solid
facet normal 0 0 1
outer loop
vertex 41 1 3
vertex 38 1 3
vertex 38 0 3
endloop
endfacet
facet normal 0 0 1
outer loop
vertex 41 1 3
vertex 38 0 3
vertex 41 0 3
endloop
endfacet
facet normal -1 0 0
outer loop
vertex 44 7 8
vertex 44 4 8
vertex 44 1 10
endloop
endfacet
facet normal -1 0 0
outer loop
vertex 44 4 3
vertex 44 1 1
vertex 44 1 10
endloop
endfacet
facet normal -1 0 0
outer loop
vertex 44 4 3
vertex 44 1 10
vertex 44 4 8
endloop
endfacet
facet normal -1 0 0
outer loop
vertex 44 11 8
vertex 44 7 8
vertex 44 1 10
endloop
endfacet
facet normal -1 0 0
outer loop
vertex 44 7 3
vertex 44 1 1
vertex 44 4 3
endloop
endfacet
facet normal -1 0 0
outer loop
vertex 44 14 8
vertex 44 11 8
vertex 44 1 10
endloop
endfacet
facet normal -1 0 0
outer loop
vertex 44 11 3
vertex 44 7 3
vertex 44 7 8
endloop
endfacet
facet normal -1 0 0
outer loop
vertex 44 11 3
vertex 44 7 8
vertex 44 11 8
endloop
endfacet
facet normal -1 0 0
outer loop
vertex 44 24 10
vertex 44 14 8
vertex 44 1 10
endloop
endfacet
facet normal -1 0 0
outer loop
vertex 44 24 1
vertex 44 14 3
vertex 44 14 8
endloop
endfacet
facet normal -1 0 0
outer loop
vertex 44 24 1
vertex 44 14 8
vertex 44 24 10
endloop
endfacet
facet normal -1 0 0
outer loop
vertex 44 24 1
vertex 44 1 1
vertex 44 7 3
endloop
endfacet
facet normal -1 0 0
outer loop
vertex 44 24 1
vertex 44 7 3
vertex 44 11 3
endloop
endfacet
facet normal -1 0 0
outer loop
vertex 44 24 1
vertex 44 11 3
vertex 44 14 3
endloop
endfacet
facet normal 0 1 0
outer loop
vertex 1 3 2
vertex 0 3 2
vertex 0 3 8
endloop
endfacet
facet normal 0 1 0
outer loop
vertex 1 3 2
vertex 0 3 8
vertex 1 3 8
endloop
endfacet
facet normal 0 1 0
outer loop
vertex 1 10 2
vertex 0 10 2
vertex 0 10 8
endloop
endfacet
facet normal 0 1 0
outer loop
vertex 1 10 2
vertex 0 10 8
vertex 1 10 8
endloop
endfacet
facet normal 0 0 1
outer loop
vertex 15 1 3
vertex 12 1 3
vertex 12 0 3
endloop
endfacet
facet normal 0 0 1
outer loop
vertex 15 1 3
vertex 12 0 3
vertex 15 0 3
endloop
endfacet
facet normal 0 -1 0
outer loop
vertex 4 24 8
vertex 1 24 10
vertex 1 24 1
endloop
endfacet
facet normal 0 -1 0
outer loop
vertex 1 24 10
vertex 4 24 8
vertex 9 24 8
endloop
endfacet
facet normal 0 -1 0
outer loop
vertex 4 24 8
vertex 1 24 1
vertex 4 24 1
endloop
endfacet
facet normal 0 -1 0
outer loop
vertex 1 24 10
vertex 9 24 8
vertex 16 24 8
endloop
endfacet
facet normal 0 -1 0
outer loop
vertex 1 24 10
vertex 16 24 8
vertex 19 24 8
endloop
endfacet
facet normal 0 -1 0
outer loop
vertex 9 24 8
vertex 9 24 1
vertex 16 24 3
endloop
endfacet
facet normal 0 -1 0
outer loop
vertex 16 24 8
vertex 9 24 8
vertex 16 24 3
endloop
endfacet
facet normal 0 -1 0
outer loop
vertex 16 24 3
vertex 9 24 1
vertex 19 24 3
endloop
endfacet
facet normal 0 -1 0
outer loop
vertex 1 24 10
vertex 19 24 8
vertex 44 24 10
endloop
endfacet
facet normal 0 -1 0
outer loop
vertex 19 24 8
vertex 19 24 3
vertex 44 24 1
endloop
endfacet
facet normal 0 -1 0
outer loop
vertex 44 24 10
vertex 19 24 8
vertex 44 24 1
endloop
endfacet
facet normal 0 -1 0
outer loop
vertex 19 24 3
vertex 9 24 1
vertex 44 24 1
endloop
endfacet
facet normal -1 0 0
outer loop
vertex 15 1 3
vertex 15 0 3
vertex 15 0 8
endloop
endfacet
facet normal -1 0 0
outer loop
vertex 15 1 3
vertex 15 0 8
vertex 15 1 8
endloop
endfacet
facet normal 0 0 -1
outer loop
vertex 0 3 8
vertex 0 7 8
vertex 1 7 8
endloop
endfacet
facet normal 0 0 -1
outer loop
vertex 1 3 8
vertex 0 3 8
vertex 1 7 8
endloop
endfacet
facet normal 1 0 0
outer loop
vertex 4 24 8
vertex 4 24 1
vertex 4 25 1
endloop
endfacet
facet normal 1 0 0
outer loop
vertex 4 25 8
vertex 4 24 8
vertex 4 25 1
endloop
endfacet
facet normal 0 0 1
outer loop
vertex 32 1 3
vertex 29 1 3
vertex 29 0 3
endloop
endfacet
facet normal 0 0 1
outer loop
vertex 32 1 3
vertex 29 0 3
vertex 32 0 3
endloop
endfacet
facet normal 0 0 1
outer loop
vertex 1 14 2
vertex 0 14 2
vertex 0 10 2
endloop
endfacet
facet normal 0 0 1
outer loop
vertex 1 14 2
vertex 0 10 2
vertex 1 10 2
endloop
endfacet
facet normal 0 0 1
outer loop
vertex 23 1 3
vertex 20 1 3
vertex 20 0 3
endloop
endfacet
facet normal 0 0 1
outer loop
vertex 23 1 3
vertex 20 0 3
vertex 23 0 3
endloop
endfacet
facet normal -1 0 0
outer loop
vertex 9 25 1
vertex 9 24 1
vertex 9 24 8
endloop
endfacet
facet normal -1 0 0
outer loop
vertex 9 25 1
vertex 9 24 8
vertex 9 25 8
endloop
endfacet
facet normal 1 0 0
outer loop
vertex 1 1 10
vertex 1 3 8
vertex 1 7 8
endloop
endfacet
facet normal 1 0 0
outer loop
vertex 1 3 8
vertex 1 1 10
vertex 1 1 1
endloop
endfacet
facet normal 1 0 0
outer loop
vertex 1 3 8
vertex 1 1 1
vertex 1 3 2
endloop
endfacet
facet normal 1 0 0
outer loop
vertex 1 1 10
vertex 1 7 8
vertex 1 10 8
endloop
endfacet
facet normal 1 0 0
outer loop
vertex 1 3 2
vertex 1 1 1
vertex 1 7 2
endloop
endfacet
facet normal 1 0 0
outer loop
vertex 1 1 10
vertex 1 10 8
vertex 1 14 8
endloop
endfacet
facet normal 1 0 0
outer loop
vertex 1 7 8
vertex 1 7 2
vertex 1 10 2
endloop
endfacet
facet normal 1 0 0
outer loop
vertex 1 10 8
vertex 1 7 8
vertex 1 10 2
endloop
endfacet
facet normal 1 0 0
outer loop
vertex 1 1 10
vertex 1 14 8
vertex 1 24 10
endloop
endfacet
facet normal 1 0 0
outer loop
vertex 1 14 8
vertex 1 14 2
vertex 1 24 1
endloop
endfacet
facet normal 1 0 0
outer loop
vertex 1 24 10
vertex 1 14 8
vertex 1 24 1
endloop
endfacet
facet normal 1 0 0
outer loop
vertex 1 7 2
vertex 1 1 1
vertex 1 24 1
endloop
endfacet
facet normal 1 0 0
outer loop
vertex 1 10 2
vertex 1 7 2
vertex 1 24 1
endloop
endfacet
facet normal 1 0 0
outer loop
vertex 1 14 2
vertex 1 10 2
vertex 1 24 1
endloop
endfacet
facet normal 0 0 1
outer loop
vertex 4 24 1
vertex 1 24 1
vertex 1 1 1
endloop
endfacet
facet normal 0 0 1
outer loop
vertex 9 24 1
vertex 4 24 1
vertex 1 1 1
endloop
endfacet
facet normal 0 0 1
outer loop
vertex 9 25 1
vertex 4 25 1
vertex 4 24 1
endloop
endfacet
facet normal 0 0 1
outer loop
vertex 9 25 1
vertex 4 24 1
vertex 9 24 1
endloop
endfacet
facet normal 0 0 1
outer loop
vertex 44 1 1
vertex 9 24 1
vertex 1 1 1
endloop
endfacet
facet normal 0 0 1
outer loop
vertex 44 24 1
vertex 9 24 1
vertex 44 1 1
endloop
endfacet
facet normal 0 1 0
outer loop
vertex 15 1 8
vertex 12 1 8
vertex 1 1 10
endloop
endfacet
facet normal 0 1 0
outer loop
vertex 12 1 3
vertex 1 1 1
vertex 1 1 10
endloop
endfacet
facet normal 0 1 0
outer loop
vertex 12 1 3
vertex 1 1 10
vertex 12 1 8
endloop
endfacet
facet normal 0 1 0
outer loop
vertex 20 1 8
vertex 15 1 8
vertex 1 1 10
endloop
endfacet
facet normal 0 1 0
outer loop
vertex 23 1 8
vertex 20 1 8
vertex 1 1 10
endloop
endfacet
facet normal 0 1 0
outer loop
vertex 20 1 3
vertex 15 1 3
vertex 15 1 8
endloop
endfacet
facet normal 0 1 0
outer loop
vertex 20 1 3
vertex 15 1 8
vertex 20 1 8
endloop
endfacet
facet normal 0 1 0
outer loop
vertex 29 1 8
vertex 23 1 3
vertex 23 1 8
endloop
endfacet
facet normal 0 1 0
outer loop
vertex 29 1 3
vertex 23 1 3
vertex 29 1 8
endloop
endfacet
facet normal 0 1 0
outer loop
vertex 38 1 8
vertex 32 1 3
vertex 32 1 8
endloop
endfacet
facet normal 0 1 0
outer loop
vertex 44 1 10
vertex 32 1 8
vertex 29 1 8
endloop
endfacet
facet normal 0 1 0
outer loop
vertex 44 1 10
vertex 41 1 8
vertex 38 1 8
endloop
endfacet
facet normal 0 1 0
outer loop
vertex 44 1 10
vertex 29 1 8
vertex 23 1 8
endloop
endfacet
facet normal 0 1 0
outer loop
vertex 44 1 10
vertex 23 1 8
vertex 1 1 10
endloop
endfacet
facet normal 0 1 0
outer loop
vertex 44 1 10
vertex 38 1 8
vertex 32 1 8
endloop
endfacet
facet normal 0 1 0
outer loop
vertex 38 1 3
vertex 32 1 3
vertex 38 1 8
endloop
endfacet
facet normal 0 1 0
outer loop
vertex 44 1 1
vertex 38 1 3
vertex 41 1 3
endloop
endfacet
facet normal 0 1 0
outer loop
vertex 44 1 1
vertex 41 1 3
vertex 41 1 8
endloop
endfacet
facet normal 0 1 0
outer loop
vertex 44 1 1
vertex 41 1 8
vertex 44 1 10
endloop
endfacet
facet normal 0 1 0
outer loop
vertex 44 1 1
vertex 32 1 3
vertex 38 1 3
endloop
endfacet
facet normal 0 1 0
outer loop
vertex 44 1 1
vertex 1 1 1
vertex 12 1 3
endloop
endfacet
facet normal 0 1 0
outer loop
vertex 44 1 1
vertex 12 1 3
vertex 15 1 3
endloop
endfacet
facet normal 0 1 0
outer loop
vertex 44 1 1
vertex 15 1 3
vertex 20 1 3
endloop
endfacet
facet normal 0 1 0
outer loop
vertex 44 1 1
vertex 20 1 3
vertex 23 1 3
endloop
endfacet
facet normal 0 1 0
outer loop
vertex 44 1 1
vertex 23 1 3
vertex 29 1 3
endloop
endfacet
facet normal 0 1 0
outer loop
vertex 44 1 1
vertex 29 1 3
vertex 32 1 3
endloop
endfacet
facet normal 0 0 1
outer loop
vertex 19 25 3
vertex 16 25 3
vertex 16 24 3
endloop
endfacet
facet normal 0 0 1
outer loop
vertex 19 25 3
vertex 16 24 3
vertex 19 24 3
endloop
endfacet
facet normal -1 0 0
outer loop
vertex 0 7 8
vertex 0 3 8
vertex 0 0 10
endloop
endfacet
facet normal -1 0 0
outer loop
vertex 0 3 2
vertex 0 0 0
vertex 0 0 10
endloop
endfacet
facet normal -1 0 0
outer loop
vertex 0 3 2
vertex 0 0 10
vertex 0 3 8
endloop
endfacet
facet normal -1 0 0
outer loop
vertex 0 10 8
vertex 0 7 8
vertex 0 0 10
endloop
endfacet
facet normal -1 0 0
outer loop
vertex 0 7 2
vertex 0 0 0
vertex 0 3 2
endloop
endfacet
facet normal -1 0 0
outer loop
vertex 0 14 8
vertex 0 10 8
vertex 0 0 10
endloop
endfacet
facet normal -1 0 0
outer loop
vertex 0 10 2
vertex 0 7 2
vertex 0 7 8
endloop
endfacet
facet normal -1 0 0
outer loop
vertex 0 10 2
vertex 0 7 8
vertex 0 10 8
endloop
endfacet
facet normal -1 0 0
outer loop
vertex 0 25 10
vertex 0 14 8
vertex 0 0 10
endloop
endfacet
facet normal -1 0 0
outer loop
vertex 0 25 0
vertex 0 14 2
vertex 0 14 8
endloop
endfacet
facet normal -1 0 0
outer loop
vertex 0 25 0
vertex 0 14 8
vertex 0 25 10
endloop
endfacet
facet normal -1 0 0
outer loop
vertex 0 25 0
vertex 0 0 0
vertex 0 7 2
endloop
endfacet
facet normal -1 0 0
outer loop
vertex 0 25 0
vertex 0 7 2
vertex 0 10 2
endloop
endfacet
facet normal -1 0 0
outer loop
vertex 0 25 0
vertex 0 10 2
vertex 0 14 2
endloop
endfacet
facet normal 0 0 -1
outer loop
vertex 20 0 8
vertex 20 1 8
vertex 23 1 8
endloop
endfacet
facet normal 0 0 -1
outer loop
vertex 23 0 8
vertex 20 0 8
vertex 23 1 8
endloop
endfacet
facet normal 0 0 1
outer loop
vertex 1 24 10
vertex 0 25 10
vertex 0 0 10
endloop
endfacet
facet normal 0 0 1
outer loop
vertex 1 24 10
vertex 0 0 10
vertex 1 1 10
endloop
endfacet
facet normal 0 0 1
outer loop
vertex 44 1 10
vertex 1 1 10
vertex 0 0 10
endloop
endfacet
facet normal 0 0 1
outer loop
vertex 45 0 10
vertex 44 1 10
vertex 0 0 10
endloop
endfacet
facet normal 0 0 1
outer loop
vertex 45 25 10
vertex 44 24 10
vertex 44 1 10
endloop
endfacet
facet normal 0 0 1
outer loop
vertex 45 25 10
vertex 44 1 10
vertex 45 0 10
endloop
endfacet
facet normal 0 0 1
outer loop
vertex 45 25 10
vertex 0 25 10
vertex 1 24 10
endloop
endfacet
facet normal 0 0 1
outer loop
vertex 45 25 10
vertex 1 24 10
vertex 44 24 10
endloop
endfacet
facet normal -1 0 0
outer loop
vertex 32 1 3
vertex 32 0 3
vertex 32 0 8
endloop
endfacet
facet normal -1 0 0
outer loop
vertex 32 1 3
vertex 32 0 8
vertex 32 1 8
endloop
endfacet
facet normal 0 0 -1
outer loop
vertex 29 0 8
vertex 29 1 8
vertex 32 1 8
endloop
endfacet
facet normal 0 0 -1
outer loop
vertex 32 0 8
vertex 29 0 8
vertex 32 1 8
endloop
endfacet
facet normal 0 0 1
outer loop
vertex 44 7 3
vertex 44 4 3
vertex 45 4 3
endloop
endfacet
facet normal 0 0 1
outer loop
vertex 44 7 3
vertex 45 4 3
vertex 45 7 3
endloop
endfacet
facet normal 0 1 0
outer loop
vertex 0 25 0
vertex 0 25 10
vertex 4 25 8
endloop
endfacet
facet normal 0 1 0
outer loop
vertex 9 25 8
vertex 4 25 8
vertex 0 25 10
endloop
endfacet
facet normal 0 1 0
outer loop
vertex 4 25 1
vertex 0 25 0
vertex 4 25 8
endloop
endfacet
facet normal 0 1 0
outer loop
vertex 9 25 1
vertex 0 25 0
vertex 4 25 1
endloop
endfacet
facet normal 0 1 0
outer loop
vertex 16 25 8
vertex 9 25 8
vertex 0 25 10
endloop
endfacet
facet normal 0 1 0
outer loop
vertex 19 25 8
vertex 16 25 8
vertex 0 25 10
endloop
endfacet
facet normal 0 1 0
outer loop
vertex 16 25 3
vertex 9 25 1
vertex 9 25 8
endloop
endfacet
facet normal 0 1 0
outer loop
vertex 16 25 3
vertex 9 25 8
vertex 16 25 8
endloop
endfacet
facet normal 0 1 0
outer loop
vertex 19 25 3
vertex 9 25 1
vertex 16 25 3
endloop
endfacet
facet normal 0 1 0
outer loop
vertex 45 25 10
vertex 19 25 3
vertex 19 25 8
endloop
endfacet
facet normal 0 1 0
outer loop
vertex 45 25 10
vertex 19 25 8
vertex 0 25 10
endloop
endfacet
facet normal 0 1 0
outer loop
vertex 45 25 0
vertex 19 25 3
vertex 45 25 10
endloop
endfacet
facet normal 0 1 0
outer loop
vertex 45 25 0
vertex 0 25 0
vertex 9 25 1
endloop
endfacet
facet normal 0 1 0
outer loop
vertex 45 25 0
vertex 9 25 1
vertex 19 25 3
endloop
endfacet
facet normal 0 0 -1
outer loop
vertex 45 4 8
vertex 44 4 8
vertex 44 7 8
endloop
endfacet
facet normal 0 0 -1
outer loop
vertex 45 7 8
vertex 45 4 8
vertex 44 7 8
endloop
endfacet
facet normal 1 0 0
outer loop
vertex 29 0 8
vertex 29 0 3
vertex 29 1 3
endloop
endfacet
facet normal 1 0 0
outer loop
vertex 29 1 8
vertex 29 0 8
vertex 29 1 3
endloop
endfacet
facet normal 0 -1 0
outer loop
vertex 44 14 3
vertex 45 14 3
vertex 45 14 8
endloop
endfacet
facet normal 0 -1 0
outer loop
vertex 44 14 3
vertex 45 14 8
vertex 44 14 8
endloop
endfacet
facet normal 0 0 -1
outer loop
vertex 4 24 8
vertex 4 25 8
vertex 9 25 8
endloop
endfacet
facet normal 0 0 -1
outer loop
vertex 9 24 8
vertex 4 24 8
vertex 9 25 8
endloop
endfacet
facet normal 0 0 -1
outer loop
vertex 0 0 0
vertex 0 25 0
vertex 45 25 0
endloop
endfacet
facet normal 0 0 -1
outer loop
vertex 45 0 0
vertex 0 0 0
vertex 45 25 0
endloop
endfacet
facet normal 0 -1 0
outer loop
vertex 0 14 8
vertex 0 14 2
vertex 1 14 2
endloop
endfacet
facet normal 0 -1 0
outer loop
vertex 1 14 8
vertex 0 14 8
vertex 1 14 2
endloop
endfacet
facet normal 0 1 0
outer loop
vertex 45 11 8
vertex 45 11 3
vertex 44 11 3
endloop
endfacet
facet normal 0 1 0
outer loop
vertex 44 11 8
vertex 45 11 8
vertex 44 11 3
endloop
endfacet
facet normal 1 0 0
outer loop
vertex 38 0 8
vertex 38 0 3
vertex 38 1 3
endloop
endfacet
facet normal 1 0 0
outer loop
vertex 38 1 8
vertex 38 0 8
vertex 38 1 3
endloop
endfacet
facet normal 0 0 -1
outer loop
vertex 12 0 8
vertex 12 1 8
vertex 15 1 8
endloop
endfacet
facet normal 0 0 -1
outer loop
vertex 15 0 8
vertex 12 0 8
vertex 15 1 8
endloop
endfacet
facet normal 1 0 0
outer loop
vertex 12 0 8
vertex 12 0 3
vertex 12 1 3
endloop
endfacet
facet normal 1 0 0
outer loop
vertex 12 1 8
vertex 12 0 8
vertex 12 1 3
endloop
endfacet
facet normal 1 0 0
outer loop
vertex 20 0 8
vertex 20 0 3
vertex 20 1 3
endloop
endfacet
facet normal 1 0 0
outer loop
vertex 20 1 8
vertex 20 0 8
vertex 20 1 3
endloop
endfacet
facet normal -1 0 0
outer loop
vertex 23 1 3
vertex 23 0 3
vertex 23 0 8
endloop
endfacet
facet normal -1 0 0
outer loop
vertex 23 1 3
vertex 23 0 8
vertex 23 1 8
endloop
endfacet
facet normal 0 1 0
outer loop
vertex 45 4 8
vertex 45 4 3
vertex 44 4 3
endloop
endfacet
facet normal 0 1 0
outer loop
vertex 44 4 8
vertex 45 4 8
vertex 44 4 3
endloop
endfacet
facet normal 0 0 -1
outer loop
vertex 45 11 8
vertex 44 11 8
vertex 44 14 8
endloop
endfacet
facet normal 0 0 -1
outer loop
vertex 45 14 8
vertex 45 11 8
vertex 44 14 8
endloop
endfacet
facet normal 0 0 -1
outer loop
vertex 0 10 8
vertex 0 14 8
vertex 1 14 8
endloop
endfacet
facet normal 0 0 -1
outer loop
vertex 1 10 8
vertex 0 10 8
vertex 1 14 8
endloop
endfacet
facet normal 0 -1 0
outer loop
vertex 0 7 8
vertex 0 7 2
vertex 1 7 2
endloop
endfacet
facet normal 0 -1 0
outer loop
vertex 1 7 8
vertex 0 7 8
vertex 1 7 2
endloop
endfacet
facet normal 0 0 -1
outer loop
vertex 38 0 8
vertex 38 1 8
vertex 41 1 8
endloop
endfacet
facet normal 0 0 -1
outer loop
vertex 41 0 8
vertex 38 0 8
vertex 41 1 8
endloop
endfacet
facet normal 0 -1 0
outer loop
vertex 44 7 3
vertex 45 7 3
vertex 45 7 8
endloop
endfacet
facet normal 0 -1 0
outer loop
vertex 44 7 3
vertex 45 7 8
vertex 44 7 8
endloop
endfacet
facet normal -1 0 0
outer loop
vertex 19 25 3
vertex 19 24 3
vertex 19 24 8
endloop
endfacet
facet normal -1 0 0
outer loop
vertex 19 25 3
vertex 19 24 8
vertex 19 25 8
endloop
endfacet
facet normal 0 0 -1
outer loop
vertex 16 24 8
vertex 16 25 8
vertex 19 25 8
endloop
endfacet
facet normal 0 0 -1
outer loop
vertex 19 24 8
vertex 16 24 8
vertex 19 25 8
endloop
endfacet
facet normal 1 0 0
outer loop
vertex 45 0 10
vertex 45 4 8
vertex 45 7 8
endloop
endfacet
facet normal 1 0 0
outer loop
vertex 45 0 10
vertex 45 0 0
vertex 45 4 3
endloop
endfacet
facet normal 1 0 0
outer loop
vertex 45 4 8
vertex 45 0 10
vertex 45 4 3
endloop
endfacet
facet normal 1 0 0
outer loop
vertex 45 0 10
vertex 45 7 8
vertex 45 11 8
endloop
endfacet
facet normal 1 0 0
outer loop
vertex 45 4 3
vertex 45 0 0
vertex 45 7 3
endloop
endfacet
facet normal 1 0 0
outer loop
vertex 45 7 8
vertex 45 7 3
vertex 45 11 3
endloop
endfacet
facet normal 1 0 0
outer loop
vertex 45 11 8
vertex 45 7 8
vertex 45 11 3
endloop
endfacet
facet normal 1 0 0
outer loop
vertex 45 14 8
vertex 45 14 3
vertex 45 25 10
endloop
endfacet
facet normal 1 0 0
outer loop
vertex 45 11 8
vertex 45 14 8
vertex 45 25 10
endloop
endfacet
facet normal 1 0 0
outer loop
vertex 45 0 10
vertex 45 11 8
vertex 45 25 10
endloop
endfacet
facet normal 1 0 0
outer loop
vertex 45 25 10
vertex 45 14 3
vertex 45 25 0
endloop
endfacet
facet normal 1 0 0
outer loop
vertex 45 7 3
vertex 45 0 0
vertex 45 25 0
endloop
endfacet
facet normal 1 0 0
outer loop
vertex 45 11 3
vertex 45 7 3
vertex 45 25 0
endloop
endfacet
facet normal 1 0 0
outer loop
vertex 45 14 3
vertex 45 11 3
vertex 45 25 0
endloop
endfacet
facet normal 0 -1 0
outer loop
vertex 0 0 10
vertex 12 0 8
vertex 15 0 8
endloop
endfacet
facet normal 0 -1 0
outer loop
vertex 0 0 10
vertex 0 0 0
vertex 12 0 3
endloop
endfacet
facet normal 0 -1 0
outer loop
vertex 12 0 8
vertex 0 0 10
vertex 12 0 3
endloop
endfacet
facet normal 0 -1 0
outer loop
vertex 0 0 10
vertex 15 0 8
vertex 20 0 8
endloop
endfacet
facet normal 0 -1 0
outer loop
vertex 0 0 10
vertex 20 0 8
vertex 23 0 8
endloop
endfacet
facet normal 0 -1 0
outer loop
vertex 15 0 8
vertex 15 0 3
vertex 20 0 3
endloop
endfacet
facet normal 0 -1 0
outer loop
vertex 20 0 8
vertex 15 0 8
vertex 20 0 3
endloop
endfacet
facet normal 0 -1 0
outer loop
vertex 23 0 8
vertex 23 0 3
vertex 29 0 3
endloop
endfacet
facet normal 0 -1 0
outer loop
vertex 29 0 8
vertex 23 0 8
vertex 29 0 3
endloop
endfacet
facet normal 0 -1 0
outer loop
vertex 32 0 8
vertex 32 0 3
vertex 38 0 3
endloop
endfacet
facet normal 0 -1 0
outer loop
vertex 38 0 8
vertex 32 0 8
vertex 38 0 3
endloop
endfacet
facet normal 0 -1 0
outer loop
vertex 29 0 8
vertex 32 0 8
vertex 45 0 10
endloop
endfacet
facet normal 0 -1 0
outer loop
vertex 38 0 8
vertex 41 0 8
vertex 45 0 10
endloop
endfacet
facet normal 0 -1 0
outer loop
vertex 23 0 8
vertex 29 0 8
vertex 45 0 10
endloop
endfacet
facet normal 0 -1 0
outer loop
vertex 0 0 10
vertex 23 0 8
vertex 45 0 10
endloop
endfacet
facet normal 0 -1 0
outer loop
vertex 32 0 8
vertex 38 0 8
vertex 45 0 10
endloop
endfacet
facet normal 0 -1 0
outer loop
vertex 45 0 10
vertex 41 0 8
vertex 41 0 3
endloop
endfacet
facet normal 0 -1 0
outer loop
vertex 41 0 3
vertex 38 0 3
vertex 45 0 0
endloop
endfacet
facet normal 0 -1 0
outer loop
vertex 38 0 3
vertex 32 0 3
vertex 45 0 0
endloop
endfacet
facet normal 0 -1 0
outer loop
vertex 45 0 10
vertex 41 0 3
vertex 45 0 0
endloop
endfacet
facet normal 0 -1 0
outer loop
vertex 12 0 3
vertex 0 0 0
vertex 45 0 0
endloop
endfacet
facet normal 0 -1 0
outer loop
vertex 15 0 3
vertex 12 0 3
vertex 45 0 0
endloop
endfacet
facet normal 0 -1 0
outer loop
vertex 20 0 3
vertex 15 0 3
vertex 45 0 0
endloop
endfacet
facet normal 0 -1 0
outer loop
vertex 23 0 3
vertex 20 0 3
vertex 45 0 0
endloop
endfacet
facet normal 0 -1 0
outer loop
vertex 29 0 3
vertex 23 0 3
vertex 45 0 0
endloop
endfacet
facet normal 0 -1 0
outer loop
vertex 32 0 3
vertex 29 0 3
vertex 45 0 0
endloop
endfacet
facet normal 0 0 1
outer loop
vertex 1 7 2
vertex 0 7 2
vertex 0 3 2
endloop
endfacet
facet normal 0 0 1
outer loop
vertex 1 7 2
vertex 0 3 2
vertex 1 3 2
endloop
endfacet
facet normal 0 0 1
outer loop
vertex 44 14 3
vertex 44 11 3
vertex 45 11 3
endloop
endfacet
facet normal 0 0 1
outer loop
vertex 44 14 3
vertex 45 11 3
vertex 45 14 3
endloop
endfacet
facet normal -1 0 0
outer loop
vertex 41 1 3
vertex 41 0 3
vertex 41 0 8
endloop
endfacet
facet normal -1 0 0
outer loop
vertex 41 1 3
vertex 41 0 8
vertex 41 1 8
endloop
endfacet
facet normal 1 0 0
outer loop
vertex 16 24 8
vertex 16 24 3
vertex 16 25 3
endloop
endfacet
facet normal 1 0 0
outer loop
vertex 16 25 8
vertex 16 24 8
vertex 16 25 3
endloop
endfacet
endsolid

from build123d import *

# Parameters (mm, degrees)
BOX101_W     = 3
BOX101_H     = 4
BOX101_DEPTH = 6
BOX060_W     = 3
BOX060_H     = 6
BOX060_DEPTH = 5
BOX061_W     = 3
BOX061_H     = 6
BOX061_DEPTH = 5
BOX063_W     = 3
BOX063_H     = 6
BOX063_DEPTH = 5
BOX062_W     = 3
BOX062_H     = 6
BOX062_DEPTH = 5
BOX058_W     = 3
BOX058_H     = 6
BOX058_DEPTH = 5
BOX059_W     = 3
BOX059_H     = 6
BOX059_DEPTH = 5
BOX056_W     = 3
BOX056_H     = 6
BOX056_DEPTH = 5
BOX026_W     = 5
BOX026_H     = 7
BOX026_DEPTH = 7
BOX020_W     = 6
BOX020_H     = 4
BOX020_DEPTH = 6
BOX_W        = 43
BOX_H        = 23
BOX_DEPTH    = 10
BOX001_W     = 45
BOX001_H     = 25
BOX001_DEPTH = 10


with BuildPart() as box101:
    # Box101 → Box101 (new body)
    with BuildSketch(Plane(origin=(0, 3, 2), x_dir=(1, 0, 0), z_dir=(0, 0, 1))):
        with Locations((1.5, 2)):
            Rectangle(BOX101_W, BOX101_H)
    extrude(amount=BOX101_DEPTH)


with BuildPart() as box060:
    # Box060 → Box060 (new body)
    with BuildSketch(Plane(origin=(29, -2, 3), x_dir=(1, 0, 0), z_dir=(0, 0, 1))):
        with Locations((1.5, 3)):
            Rectangle(BOX060_W, BOX060_H)
    extrude(amount=BOX060_DEPTH)


with BuildPart() as box061:
    # Box061 → Box061 (new body)
    with BuildSketch(Plane(origin=(38, -2, 3), x_dir=(1, 0, 0), z_dir=(0, 0, 1))):
        with Locations((1.5, 3)):
            Rectangle(BOX061_W, BOX061_H)
    extrude(amount=BOX061_DEPTH)


with BuildPart() as box063:
    # Box063 → Box063 (new body)
    with BuildSketch(Plane(origin=(46, 11, 3), x_dir=(0, 1, 0), z_dir=(0, 0, 1))):
        with Locations((1.5, 3)):
            Rectangle(BOX063_W, BOX063_H)
    extrude(amount=BOX063_DEPTH)


with BuildPart() as box062:
    # Box062 → Box062 (new body)
    with BuildSketch(Plane(origin=(46, 4, 3), x_dir=(0, 1, 0), z_dir=(0, 0, 1))):
        with Locations((1.5, 3)):
            Rectangle(BOX062_W, BOX062_H)
    extrude(amount=BOX062_DEPTH)


with BuildPart() as box058:
    # Box058 → Box058 (new body)
    with BuildSketch(Plane(origin=(12, -2, 3), x_dir=(1, 0, 0), z_dir=(0, 0, 1))):
        with Locations((1.5, 3)):
            Rectangle(BOX058_W, BOX058_H)
    extrude(amount=BOX058_DEPTH)


with BuildPart() as box059:
    # Box059 → Box059 (new body)
    with BuildSketch(Plane(origin=(20, -2, 3), x_dir=(1, 0, 0), z_dir=(0, 0, 1))):
        with Locations((1.5, 3)):
            Rectangle(BOX059_W, BOX059_H)
    extrude(amount=BOX059_DEPTH)


with BuildPart() as box056:
    # Box056 → Box056 (new body)
    with BuildSketch(Plane(origin=(16, 20, 3), x_dir=(1, 0, 0), z_dir=(0, 0, 1))):
        with Locations((1.5, 3)):
            Rectangle(BOX056_W, BOX056_H)
    extrude(amount=BOX056_DEPTH)


with BuildPart() as box026:
    # Box026 → Box026 (new body)
    with BuildSketch(Plane(origin=(4, 20, 1), x_dir=(1, 0, 0), z_dir=(0, 0, 1))):
        with Locations((2.5, 3.5)):
            Rectangle(BOX026_W, BOX026_H)
    extrude(amount=BOX026_DEPTH)


with BuildPart() as box020:
    # Box020 → Box020 (new body)
    with BuildSketch(Plane(origin=(-2, 10, 2), x_dir=(1, 0, 0), z_dir=(0, 0, 1))):
        with Locations((3, 2)):
            Rectangle(BOX020_W, BOX020_H)
    extrude(amount=BOX020_DEPTH)


with BuildPart() as box:
    # Box → Box (new body)
    with BuildSketch(Plane(origin=(1, 1, 1), x_dir=(1, 0, 0), z_dir=(0, 0, 1))):
        with Locations((21.5, 11.5)):
            Rectangle(BOX_W, BOX_H)
    extrude(amount=BOX_DEPTH)


with BuildPart() as cut037:
    # Box001 → Box001 (new body)
    with BuildSketch(Plane.XY):
        with Locations((22.5, 12.5)):
            Rectangle(BOX001_W, BOX001_H)
    extrude(amount=BOX001_DEPTH)

    # Cut: cut Box
    add(box.part, mode=Mode.SUBTRACT)

    # Cut001: cut Box020
    add(box020.part, mode=Mode.SUBTRACT)

    # Cut029: cut Box026
    add(box026.part, mode=Mode.SUBTRACT)

    # Cut030: cut Box056
    add(box056.part, mode=Mode.SUBTRACT)

    # Cut031: cut Box059
    add(box059.part, mode=Mode.SUBTRACT)

    # Cut032: cut Box058
    add(box058.part, mode=Mode.SUBTRACT)

    # Cut033: cut Box062
    add(box062.part, mode=Mode.SUBTRACT)

    # Cut034: cut Box063
    add(box063.part, mode=Mode.SUBTRACT)

    # Cut035: cut Box061
    add(box061.part, mode=Mode.SUBTRACT)

    # Cut036: cut Box060
    add(box060.part, mode=Mode.SUBTRACT)

    # Cut037: cut Box101
    add(box101.part, mode=Mode.SUBTRACT)


solid = cut037.part
